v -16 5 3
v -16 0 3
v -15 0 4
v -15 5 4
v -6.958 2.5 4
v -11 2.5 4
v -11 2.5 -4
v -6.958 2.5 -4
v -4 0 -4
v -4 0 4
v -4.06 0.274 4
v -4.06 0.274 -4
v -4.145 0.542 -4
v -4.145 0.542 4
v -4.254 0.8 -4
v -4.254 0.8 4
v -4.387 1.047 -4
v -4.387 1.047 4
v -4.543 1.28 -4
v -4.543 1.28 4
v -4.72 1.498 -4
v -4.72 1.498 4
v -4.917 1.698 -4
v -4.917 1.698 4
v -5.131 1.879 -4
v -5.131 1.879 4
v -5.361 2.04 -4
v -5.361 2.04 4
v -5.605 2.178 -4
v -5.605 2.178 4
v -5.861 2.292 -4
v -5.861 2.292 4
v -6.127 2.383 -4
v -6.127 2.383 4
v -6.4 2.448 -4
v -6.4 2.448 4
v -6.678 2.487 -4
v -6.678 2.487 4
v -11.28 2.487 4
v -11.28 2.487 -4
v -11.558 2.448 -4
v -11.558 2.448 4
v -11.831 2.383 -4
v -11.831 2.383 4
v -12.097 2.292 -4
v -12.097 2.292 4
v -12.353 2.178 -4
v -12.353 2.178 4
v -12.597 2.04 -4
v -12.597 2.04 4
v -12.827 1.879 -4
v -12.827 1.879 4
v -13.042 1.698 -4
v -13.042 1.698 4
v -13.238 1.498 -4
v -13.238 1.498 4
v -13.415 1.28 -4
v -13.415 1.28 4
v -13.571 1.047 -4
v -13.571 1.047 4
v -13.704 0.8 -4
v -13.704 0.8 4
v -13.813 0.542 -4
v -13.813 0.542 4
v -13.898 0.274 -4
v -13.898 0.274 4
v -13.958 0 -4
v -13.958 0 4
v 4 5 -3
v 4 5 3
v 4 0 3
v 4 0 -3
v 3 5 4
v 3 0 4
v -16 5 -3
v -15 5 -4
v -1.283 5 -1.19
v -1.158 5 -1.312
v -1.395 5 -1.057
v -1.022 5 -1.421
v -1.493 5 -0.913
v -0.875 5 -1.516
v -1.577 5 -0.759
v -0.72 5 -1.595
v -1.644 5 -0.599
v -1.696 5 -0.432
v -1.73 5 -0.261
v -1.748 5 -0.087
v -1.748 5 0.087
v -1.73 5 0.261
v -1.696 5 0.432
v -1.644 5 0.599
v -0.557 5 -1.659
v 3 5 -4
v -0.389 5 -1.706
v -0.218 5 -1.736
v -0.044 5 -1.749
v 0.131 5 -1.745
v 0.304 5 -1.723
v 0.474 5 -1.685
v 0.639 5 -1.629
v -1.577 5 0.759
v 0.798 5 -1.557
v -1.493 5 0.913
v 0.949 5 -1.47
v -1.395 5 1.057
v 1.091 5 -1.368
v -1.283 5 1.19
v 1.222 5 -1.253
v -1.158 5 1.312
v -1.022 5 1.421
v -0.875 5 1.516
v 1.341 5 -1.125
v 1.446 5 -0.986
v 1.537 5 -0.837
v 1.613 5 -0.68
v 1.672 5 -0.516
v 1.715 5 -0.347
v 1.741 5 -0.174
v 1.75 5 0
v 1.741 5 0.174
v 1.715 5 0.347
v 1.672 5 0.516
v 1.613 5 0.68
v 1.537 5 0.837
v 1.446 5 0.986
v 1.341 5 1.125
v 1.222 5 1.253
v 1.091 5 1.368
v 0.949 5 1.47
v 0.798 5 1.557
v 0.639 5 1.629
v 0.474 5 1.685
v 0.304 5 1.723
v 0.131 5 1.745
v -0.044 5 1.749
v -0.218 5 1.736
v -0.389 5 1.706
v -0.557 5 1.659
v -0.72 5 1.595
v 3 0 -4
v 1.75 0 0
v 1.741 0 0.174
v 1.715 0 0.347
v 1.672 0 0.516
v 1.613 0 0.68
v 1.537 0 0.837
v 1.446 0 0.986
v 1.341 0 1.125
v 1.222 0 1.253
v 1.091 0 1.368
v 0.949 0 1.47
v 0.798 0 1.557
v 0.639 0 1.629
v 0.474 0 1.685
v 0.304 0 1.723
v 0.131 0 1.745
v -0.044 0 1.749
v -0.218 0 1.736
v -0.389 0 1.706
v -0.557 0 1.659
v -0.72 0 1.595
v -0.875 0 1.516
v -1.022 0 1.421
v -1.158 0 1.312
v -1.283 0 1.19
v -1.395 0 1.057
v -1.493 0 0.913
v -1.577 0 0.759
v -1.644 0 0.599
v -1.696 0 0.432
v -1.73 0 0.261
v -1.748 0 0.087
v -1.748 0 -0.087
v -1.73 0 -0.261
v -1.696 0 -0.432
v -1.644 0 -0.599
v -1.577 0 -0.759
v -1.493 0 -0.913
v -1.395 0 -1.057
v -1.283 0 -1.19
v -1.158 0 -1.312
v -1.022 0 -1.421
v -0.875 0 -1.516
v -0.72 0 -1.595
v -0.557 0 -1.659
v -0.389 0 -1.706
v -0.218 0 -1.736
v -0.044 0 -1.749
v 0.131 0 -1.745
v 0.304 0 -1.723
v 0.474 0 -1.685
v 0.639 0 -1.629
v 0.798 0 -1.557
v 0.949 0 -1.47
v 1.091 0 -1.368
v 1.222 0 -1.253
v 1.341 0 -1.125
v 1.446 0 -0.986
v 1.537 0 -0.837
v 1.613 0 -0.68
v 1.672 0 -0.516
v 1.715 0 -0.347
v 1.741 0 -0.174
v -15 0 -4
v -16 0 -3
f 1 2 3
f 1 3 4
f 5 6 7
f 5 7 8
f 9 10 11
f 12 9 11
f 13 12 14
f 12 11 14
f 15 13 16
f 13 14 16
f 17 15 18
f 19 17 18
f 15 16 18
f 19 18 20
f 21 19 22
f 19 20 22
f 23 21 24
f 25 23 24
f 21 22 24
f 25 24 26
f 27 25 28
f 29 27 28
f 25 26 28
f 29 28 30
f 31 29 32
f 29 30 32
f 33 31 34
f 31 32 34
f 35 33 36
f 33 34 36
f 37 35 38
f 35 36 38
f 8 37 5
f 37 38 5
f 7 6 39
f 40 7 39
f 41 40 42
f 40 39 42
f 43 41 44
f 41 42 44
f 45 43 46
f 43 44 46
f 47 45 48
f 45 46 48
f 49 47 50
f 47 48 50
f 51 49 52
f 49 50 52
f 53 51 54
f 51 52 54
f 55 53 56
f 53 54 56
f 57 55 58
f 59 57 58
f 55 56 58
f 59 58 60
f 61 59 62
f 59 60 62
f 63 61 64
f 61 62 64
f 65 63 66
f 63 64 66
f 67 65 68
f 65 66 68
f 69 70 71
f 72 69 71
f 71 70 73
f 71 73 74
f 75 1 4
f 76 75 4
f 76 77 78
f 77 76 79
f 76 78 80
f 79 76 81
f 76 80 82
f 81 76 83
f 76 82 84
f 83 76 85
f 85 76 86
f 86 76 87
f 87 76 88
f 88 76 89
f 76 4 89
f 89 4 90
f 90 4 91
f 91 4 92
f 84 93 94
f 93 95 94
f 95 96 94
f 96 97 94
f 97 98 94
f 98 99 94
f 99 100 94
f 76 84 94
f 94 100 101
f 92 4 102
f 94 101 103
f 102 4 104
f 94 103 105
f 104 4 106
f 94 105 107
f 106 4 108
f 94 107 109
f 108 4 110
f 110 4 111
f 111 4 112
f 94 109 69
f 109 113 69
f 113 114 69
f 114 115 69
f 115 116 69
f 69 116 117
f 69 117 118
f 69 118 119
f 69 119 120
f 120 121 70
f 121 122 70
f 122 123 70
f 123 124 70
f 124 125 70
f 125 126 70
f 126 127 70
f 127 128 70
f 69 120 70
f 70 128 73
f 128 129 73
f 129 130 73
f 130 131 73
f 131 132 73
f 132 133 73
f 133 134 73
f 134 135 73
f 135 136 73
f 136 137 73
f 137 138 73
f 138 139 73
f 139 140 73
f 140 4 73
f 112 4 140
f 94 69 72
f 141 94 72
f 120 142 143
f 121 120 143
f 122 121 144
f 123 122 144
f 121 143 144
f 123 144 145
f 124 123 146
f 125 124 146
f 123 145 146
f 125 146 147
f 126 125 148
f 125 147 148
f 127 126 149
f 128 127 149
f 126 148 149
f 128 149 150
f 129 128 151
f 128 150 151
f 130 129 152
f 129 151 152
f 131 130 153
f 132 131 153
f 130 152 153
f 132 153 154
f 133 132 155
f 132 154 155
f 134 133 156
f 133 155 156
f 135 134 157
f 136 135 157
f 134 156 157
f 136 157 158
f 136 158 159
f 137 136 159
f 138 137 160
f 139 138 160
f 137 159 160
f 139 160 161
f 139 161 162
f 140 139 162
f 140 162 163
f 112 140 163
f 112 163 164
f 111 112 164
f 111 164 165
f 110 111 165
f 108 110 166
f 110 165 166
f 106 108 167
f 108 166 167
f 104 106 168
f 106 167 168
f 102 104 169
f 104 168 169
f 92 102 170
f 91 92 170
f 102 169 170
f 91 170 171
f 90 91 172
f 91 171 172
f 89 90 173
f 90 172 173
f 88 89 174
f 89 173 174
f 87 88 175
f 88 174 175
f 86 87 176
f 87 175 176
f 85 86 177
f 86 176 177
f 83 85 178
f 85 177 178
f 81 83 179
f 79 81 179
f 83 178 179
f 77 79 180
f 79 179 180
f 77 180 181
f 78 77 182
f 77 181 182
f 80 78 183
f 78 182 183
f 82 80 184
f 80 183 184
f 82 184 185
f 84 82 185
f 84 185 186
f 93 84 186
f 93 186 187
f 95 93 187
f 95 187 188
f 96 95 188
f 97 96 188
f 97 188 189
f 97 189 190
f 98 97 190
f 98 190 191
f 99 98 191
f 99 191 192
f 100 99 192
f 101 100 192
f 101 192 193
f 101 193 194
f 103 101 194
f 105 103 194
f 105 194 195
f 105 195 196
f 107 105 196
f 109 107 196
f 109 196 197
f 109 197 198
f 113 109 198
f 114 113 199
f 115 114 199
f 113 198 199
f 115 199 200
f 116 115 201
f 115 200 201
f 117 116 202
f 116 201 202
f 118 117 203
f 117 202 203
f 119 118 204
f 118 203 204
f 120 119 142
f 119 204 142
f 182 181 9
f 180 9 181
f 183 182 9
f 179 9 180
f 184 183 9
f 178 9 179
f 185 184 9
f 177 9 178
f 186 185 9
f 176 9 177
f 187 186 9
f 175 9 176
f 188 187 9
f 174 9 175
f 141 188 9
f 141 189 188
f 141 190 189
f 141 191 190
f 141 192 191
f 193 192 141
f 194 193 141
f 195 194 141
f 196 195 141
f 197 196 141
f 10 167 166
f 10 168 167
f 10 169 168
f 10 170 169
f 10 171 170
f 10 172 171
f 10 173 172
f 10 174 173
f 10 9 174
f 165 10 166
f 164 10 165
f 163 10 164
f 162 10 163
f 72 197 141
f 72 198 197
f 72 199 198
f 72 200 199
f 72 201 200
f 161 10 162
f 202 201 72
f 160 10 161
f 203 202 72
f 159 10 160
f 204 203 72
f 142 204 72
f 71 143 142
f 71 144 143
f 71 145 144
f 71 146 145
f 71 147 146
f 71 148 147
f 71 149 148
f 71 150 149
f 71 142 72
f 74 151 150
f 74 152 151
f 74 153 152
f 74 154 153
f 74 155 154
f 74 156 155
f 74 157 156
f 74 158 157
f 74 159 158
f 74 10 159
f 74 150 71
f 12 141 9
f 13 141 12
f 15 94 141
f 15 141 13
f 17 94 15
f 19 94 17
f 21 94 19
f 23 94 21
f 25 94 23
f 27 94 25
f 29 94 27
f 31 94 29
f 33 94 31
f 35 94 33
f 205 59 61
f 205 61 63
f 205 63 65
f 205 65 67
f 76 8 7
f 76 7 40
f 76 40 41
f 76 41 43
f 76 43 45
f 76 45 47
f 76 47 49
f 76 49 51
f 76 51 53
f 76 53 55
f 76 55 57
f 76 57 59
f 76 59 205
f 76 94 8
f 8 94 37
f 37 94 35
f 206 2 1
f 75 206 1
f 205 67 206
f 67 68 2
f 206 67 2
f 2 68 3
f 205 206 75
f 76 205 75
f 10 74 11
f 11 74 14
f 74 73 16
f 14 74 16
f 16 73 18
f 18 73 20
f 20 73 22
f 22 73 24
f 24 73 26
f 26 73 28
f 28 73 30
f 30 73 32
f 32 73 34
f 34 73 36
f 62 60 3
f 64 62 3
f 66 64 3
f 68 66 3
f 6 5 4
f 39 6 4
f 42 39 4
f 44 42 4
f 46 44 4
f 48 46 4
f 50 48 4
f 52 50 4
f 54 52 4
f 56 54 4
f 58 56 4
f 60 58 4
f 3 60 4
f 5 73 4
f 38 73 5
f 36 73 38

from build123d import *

# Parameters (mm, degrees)
PAD_DEPTH      = 4
PAD_DEPTH_BACK = 4
SKETCH001_R    = 1.75
POCKET_DEPTH   = 5
CHAMFER_SIZE   = 1


with BuildPart() as part:
    # Sketch → Pad (new body, two sides)
    with BuildSketch(Plane.XY) as pad_sk:
        with BuildLine():
            ThreePointArc((-10.999985, 2.5), (-12.936486, 1.791293), (-13.95804, 0))
            Line((-13.95804, 0), (-16, 0))
            Line((-16, 0), (-16, 5))
            Line((-16, 5), (4, 5))
            Line((4, 5), (4, 0))
            Line((-4, 0), (4, 0))
            ThreePointArc((-4, 0), (-5.021548, 1.791287), (-6.958038, 2.5))
            Line((-10.999985, 2.5), (-6.958038, 2.5))
        make_face()
    extrude(amount=PAD_DEPTH)
    extrude(pad_sk.sketch, amount=-PAD_DEPTH_BACK)

    # Sketch001 → Pocket (cut)
    with BuildSketch(Plane.XZ):
        Circle(SKETCH001_R)
    extrude(amount=-POCKET_DEPTH, mode=Mode.SUBTRACT)

    # Chamfer
    chamfer_edges = [part.edges().sort_by_distance(p)[0] for p in [
        (-16, 2.5, 4),
        (-16, 2.5, -4),
        (4, 2.5, -4),
        (4, 2.5, 4),
    ]]
    chamfer(chamfer_edges, length=CHAMFER_SIZE)


solid = part.part
